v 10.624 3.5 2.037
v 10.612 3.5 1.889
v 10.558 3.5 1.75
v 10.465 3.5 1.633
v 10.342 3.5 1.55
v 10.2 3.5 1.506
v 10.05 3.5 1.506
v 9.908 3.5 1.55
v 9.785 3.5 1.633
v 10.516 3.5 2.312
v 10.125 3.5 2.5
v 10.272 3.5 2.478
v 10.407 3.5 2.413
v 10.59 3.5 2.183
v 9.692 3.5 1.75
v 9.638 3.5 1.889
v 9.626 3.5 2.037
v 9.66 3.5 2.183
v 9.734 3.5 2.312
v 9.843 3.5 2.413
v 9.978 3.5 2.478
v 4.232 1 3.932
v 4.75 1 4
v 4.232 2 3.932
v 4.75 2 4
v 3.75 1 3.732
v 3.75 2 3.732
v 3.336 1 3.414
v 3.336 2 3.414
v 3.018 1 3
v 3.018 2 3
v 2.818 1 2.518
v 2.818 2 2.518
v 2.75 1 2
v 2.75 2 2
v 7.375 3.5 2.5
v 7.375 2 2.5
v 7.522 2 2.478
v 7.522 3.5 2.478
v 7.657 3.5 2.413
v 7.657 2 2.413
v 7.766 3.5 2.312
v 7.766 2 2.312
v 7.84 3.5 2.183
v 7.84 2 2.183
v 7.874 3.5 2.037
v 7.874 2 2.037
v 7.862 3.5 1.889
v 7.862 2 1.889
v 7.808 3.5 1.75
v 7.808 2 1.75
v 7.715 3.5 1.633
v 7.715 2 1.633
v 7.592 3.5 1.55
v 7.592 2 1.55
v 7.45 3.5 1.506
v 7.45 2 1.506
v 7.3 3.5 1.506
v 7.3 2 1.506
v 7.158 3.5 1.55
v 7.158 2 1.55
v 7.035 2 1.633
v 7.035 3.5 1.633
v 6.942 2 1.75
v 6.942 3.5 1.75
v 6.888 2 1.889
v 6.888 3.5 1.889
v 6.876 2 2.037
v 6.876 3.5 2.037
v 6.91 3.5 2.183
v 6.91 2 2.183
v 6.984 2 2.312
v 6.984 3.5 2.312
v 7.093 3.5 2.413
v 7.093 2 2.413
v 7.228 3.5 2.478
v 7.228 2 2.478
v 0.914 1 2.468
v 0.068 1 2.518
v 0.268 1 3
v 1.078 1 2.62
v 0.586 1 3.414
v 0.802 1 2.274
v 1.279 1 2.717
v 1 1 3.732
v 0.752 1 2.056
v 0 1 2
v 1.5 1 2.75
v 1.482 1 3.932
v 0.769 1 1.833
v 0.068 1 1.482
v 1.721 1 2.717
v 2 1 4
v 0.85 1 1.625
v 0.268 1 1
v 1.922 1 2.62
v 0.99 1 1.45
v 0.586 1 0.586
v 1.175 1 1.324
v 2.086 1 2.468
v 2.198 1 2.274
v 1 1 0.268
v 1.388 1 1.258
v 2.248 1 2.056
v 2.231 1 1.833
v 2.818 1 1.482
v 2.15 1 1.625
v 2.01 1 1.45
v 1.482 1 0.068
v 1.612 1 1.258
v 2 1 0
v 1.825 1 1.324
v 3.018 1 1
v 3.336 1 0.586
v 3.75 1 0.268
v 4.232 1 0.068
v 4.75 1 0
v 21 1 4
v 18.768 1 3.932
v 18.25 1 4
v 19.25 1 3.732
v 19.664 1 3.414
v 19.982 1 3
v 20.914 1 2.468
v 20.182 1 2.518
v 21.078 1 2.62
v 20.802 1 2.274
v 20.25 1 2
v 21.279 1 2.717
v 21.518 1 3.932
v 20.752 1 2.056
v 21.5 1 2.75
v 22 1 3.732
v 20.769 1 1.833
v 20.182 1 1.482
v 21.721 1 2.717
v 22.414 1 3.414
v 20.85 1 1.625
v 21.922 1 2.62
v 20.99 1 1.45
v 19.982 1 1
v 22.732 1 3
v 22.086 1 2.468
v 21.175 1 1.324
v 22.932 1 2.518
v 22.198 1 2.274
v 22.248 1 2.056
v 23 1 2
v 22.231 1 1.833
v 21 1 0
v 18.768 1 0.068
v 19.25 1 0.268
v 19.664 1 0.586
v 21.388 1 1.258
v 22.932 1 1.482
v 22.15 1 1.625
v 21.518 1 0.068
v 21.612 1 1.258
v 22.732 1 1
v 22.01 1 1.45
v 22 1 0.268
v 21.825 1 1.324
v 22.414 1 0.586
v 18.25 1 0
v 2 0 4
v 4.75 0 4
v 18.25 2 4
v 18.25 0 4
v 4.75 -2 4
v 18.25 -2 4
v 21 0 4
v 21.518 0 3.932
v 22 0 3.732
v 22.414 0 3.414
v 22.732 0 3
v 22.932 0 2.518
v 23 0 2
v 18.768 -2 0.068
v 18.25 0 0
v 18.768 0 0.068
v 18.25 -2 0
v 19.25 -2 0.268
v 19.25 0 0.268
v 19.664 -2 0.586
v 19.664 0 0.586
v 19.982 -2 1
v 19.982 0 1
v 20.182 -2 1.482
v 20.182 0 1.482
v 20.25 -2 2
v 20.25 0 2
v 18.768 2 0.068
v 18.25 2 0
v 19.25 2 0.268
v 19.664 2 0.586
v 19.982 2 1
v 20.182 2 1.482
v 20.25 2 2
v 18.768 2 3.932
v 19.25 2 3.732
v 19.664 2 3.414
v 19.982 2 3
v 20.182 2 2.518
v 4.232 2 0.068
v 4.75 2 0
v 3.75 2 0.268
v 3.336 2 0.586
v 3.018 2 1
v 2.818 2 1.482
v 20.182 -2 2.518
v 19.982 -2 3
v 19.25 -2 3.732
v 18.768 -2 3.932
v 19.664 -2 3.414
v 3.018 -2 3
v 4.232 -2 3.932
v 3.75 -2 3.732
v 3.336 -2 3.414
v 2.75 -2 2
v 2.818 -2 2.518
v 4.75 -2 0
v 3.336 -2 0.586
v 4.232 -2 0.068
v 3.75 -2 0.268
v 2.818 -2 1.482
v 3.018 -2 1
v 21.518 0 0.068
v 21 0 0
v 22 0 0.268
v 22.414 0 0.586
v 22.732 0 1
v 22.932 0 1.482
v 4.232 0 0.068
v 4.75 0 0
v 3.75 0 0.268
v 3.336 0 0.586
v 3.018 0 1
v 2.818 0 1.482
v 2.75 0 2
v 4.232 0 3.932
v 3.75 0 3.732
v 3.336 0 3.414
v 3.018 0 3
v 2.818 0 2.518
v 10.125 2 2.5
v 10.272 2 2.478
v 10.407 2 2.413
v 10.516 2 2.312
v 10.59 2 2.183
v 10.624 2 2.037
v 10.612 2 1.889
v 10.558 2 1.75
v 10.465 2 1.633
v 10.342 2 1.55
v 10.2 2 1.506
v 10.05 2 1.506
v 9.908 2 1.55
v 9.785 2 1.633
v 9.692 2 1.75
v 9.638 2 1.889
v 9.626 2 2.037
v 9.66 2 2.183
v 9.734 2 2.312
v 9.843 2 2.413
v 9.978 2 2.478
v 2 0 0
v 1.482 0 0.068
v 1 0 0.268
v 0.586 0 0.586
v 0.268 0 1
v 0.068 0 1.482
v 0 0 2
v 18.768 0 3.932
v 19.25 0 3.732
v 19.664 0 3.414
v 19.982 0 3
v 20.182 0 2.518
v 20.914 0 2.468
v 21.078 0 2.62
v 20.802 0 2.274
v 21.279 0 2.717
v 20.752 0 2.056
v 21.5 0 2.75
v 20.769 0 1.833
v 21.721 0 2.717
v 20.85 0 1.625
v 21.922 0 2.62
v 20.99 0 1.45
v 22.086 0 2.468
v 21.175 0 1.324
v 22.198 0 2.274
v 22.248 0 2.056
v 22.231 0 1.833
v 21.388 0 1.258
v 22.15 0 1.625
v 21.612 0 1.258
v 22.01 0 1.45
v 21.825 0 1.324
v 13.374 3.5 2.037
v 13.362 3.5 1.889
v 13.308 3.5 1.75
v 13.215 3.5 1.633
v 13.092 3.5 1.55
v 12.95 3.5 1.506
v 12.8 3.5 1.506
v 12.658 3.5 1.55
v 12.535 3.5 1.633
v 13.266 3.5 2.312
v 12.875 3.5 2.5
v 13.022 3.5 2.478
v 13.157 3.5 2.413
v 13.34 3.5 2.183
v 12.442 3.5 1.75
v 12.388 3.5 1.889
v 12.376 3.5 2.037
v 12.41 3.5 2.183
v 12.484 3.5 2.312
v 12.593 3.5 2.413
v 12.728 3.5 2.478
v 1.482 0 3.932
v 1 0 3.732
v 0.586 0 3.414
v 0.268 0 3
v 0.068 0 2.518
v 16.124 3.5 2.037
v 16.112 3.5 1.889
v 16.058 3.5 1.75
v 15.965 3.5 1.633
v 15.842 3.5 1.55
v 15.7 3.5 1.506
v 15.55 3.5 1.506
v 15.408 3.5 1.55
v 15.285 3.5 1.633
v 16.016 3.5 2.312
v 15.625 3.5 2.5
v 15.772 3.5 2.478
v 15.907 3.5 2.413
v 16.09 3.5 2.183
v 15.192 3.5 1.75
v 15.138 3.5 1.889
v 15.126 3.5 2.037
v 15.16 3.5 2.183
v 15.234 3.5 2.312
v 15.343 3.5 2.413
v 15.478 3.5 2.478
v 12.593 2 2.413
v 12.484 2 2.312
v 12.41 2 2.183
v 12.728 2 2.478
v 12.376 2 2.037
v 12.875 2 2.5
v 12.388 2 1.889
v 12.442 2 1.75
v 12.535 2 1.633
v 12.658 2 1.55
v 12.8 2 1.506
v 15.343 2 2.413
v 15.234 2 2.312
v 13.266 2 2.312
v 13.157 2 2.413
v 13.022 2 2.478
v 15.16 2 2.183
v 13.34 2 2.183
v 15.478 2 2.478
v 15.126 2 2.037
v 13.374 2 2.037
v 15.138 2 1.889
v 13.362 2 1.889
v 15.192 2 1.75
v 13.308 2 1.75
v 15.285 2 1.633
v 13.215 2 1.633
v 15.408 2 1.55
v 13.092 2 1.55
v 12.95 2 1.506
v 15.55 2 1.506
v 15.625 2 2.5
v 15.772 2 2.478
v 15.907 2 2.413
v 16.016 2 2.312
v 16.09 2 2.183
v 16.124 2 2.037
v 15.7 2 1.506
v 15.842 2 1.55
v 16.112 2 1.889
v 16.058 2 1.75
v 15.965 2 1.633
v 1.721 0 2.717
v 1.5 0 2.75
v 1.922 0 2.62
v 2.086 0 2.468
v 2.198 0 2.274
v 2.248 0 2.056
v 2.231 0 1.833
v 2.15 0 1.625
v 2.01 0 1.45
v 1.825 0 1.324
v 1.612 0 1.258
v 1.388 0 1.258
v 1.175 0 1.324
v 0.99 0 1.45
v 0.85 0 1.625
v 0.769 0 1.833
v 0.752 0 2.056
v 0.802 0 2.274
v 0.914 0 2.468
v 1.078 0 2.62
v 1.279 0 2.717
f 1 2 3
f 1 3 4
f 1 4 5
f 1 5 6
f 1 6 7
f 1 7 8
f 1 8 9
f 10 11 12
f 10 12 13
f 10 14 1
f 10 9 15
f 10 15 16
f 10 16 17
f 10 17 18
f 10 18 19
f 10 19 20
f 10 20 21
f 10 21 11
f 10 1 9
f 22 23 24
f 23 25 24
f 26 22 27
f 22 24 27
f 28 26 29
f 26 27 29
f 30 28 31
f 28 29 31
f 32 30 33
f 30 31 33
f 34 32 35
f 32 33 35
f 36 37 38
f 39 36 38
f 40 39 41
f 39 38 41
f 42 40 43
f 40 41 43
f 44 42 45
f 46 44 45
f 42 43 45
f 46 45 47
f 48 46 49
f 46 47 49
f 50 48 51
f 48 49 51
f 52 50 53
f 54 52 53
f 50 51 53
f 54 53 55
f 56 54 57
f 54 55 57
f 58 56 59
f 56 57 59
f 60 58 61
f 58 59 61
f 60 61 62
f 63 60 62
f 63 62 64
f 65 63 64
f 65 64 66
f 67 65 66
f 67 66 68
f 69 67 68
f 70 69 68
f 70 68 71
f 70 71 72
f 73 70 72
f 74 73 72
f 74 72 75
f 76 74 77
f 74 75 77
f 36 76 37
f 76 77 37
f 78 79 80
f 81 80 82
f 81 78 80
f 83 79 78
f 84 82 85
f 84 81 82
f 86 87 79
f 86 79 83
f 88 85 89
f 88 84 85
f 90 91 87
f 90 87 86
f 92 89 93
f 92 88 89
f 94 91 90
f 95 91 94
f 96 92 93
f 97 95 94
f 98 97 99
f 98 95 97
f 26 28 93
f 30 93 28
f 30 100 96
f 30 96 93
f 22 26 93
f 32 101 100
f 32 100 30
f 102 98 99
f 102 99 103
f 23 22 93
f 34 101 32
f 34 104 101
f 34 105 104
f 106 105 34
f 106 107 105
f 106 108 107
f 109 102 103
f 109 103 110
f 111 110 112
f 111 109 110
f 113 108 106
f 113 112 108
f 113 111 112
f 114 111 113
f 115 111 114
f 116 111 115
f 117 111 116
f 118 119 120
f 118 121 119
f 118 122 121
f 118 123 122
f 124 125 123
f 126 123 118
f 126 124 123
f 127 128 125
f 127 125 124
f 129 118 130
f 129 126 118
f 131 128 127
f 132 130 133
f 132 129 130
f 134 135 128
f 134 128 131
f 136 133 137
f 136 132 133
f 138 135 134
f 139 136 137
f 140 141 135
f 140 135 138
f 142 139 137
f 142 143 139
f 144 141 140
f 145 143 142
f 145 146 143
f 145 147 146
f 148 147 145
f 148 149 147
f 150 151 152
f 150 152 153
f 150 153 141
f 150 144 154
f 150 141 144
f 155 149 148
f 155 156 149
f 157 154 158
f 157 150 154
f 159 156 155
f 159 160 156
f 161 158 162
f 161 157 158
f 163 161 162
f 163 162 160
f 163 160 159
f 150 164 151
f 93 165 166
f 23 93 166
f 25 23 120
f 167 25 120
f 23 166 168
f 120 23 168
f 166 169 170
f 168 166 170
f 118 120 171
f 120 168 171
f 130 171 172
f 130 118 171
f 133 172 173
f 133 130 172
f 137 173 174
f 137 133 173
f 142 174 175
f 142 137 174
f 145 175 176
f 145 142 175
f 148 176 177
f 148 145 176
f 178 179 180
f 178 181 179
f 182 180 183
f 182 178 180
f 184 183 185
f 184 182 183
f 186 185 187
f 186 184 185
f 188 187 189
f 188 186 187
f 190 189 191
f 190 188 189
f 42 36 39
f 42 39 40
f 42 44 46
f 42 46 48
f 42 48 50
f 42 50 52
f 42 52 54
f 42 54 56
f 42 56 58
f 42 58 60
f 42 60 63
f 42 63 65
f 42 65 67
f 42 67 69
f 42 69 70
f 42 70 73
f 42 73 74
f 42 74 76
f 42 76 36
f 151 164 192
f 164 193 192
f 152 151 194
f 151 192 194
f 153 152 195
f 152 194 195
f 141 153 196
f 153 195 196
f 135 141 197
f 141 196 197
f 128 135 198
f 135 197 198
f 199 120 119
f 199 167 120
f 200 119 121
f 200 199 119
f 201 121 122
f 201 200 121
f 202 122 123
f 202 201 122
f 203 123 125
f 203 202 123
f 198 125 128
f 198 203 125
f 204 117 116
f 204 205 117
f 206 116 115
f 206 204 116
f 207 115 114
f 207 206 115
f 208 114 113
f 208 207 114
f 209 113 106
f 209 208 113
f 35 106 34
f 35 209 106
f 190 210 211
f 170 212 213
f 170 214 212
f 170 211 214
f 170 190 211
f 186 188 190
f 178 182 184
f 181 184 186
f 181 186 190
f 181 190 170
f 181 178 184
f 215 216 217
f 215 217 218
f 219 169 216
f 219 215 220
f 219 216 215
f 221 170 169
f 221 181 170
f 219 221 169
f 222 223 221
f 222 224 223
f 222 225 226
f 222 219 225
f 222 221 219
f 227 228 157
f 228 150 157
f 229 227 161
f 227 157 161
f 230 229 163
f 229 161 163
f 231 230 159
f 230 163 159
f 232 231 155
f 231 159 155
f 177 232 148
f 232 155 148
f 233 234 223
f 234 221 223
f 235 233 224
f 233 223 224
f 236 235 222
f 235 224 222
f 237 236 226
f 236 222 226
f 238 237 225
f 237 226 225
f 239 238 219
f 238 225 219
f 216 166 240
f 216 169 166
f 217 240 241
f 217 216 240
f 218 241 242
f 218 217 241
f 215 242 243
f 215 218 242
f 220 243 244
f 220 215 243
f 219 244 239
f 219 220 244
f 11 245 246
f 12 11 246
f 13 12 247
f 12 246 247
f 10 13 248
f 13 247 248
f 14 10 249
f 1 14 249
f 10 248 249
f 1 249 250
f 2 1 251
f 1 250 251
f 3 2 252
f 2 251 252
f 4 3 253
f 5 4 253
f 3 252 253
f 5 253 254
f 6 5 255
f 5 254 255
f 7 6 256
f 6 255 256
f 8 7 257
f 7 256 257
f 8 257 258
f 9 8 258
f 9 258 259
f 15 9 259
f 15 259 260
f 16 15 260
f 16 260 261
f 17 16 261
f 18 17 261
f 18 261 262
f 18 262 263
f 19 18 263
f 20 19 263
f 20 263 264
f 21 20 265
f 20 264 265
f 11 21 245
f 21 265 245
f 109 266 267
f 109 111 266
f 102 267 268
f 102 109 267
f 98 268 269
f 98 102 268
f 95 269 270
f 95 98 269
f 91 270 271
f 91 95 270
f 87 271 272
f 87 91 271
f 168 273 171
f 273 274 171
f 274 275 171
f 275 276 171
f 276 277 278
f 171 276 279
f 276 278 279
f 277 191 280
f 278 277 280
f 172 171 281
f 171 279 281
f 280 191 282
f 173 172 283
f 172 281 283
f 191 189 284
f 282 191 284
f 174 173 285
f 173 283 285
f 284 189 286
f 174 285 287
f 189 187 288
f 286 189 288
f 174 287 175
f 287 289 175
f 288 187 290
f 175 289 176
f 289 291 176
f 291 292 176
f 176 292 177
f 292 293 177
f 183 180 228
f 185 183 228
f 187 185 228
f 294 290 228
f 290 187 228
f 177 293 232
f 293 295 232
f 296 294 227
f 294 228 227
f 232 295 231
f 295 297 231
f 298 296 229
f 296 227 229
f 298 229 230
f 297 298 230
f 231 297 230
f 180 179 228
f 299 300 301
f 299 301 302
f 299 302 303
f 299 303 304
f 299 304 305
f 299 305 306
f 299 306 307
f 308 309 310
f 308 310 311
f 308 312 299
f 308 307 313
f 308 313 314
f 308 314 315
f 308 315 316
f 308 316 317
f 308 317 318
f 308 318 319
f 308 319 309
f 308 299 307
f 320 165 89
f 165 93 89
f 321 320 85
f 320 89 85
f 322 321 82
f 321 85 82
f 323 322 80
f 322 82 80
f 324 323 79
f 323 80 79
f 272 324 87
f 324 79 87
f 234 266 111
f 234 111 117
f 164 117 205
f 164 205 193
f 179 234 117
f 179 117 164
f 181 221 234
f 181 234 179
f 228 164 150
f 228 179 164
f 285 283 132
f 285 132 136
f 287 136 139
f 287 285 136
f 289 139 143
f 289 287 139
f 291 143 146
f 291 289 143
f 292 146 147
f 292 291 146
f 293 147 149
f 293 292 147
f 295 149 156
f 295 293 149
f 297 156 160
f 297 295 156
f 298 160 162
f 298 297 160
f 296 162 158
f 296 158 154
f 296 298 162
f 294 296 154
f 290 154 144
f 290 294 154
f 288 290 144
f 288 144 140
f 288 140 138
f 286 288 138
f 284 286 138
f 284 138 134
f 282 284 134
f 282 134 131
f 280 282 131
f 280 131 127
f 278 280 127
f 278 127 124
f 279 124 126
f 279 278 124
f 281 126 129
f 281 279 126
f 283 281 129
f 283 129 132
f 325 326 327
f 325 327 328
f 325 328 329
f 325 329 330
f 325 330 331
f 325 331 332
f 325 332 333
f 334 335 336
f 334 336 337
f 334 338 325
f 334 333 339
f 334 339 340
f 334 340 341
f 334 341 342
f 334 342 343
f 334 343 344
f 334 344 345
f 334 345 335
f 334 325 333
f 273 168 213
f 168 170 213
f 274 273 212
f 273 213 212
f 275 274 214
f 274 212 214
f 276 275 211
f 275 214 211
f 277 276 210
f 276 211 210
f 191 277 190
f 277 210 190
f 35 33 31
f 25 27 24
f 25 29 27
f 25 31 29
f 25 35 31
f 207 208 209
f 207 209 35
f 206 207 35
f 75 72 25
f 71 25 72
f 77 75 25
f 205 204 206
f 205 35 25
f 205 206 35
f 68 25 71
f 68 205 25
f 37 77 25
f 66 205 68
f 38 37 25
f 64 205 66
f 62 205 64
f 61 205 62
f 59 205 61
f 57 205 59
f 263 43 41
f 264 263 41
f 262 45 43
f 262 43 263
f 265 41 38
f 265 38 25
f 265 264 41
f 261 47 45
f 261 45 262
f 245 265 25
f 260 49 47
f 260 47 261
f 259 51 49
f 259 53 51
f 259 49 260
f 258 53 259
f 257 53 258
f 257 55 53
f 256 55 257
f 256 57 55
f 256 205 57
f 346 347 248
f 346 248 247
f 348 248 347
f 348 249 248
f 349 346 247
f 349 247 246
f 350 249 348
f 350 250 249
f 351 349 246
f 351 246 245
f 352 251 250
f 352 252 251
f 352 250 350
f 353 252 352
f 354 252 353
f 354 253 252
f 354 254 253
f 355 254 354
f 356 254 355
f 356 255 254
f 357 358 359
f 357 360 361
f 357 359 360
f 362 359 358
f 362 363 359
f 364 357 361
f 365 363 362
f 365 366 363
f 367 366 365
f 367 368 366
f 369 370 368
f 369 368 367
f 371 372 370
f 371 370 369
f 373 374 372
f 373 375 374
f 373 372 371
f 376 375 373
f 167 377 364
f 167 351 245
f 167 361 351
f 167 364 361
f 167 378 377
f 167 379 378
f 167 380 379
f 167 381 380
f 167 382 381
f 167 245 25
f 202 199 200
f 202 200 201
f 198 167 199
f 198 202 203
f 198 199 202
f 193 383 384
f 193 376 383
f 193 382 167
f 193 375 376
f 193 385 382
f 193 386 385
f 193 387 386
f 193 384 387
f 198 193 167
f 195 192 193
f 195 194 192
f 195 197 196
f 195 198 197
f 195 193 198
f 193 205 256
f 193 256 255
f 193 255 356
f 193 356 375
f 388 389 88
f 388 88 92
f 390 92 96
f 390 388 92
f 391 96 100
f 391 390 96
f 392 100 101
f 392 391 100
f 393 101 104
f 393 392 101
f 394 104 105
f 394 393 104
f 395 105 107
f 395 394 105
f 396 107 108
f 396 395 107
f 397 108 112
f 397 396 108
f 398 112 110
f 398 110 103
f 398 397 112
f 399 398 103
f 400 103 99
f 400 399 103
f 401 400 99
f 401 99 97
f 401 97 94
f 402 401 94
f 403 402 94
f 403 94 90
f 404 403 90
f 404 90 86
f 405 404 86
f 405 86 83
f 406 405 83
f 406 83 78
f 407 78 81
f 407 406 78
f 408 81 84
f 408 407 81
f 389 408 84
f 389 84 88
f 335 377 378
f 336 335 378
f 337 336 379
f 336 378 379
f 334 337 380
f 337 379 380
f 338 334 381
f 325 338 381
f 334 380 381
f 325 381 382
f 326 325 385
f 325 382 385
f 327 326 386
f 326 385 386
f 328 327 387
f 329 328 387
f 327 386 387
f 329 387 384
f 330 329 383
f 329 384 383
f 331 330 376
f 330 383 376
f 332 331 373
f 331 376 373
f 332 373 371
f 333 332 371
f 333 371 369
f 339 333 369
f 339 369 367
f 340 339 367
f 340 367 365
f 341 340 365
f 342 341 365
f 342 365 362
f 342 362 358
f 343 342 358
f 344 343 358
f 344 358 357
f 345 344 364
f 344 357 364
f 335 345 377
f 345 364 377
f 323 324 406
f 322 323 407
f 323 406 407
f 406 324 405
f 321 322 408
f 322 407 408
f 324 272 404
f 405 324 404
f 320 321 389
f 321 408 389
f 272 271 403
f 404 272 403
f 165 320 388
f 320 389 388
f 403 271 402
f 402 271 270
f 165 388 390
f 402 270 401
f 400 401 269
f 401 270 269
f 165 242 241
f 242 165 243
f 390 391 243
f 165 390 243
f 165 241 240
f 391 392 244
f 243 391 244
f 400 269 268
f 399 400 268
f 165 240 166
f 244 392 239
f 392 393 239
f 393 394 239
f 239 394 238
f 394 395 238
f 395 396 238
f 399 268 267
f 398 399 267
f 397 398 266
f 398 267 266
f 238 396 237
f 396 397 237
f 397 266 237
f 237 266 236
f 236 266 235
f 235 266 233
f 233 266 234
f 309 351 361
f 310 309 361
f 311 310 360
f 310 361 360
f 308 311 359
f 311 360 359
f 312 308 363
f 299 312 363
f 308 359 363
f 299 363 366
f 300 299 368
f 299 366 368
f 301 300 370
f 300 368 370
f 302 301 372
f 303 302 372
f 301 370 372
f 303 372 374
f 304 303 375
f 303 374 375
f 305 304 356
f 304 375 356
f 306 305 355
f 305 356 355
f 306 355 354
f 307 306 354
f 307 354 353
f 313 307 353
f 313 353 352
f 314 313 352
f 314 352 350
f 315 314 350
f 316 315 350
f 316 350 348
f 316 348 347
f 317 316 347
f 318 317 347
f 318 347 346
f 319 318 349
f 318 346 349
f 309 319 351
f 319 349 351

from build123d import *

# Parameters (mm, degrees)
SKETCH1_W           = 23
SKETCH1_H           = 4
SKETCH1_R           = 0.75
BOSS_EXTRUDE1_DEPTH = 1
SKETCH2_W           = 17.5
SKETCH2_H           = 4
BOSS_EXTRUDE2_DEPTH = 1
SKETCH3_W           = 17.5
SKETCH3_H           = 4
BOSS_EXTRUDE3_DEPTH = 2
SKETCH4_R           = 0.5
BOSS_EXTRUDE4_DEPTH = 1.5
FILLET1_R           = 2
FILLET2_R           = 2


with BuildPart() as part:
    # Sketch1 → Boss-Extrude1 (new body)
    with BuildSketch(Plane(origin=(0, 0, 0), x_dir=(1, 0, 0), z_dir=(0, 1, 0))):
        with Locations((11.5, -2)):
            Rectangle(SKETCH1_W, SKETCH1_H)
        with Locations(Location((1.5, -2, 0), (0, 0, 270))):
            Circle(SKETCH1_R, mode=Mode.SUBTRACT)
        with Locations(Location((21.5, -2, 0), (0, 0, 270))):
            Circle(SKETCH1_R, mode=Mode.SUBTRACT)
    extrude(amount=BOSS_EXTRUDE1_DEPTH)

    # Sketch2 → Boss-Extrude2 (add)
    with BuildSketch(Plane(origin=(0, 1, 0), x_dir=(1, 0, 0), z_dir=(0, 1, 0))):
        with Locations((11.5, -2)):
            Rectangle(SKETCH2_W, SKETCH2_H)
    extrude(amount=BOSS_EXTRUDE2_DEPTH)

    # Sketch3 → Boss-Extrude3 (add)
    with BuildSketch(Plane(origin=(0, 0, 0), x_dir=(-1, 0, 0), z_dir=(0, -1, 0))):
        with Locations((-11.5, -2)):
            Rectangle(SKETCH3_W, SKETCH3_H)
    extrude(amount=BOSS_EXTRUDE3_DEPTH)

    # Sketch4 → Boss-Extrude4 (add)
    with BuildSketch(Plane(origin=(0, 2, 0), x_dir=(1, 0, 0), z_dir=(0, 1, 0))):
        with Locations(Location((7.375, -2, 0), (0, 0, 270))):
            Circle(SKETCH4_R)
        with Locations(Location((10.125, -2, 0), (0, 0, 270))):
            Circle(SKETCH4_R)
        with Locations(Location((12.875, -2, 0), (0, 0, 270))):
            Circle(SKETCH4_R)
        with Locations(Location((15.625, -2, 0), (0, 0, 270))):
            Circle(SKETCH4_R)
    extrude(amount=BOSS_EXTRUDE4_DEPTH)

    # Fillet1
    fillet1_edges = [part.edges().sort_by_distance(p)[0] for p in [
        (20.25, -1, 4),
        (20.25, -1, 0),
        (20.25, 1.5, 0),
        (20.25, 1.5, 4),
        (2.75, 1.5, 4),
        (2.75, 1.5, 0),
        (2.75, -1, 0),
        (2.75, -1, 4),
    ]]
    fillet(fillet1_edges, radius=FILLET1_R - 0.0001)  # a hair under: the kernel refuses the full size

    # Fillet2
    fillet2_edges = [part.edges().sort_by_distance(p)[0] for p in [
        (0, 0.5, 4),
        (0, 0.5, 0),
        (23, 0.5, 0),
        (23, 0.5, 4),
    ]]
    fillet(fillet2_edges, radius=FILLET2_R - 0.0001)  # a hair under: the kernel refuses the full size


solid = part.part
